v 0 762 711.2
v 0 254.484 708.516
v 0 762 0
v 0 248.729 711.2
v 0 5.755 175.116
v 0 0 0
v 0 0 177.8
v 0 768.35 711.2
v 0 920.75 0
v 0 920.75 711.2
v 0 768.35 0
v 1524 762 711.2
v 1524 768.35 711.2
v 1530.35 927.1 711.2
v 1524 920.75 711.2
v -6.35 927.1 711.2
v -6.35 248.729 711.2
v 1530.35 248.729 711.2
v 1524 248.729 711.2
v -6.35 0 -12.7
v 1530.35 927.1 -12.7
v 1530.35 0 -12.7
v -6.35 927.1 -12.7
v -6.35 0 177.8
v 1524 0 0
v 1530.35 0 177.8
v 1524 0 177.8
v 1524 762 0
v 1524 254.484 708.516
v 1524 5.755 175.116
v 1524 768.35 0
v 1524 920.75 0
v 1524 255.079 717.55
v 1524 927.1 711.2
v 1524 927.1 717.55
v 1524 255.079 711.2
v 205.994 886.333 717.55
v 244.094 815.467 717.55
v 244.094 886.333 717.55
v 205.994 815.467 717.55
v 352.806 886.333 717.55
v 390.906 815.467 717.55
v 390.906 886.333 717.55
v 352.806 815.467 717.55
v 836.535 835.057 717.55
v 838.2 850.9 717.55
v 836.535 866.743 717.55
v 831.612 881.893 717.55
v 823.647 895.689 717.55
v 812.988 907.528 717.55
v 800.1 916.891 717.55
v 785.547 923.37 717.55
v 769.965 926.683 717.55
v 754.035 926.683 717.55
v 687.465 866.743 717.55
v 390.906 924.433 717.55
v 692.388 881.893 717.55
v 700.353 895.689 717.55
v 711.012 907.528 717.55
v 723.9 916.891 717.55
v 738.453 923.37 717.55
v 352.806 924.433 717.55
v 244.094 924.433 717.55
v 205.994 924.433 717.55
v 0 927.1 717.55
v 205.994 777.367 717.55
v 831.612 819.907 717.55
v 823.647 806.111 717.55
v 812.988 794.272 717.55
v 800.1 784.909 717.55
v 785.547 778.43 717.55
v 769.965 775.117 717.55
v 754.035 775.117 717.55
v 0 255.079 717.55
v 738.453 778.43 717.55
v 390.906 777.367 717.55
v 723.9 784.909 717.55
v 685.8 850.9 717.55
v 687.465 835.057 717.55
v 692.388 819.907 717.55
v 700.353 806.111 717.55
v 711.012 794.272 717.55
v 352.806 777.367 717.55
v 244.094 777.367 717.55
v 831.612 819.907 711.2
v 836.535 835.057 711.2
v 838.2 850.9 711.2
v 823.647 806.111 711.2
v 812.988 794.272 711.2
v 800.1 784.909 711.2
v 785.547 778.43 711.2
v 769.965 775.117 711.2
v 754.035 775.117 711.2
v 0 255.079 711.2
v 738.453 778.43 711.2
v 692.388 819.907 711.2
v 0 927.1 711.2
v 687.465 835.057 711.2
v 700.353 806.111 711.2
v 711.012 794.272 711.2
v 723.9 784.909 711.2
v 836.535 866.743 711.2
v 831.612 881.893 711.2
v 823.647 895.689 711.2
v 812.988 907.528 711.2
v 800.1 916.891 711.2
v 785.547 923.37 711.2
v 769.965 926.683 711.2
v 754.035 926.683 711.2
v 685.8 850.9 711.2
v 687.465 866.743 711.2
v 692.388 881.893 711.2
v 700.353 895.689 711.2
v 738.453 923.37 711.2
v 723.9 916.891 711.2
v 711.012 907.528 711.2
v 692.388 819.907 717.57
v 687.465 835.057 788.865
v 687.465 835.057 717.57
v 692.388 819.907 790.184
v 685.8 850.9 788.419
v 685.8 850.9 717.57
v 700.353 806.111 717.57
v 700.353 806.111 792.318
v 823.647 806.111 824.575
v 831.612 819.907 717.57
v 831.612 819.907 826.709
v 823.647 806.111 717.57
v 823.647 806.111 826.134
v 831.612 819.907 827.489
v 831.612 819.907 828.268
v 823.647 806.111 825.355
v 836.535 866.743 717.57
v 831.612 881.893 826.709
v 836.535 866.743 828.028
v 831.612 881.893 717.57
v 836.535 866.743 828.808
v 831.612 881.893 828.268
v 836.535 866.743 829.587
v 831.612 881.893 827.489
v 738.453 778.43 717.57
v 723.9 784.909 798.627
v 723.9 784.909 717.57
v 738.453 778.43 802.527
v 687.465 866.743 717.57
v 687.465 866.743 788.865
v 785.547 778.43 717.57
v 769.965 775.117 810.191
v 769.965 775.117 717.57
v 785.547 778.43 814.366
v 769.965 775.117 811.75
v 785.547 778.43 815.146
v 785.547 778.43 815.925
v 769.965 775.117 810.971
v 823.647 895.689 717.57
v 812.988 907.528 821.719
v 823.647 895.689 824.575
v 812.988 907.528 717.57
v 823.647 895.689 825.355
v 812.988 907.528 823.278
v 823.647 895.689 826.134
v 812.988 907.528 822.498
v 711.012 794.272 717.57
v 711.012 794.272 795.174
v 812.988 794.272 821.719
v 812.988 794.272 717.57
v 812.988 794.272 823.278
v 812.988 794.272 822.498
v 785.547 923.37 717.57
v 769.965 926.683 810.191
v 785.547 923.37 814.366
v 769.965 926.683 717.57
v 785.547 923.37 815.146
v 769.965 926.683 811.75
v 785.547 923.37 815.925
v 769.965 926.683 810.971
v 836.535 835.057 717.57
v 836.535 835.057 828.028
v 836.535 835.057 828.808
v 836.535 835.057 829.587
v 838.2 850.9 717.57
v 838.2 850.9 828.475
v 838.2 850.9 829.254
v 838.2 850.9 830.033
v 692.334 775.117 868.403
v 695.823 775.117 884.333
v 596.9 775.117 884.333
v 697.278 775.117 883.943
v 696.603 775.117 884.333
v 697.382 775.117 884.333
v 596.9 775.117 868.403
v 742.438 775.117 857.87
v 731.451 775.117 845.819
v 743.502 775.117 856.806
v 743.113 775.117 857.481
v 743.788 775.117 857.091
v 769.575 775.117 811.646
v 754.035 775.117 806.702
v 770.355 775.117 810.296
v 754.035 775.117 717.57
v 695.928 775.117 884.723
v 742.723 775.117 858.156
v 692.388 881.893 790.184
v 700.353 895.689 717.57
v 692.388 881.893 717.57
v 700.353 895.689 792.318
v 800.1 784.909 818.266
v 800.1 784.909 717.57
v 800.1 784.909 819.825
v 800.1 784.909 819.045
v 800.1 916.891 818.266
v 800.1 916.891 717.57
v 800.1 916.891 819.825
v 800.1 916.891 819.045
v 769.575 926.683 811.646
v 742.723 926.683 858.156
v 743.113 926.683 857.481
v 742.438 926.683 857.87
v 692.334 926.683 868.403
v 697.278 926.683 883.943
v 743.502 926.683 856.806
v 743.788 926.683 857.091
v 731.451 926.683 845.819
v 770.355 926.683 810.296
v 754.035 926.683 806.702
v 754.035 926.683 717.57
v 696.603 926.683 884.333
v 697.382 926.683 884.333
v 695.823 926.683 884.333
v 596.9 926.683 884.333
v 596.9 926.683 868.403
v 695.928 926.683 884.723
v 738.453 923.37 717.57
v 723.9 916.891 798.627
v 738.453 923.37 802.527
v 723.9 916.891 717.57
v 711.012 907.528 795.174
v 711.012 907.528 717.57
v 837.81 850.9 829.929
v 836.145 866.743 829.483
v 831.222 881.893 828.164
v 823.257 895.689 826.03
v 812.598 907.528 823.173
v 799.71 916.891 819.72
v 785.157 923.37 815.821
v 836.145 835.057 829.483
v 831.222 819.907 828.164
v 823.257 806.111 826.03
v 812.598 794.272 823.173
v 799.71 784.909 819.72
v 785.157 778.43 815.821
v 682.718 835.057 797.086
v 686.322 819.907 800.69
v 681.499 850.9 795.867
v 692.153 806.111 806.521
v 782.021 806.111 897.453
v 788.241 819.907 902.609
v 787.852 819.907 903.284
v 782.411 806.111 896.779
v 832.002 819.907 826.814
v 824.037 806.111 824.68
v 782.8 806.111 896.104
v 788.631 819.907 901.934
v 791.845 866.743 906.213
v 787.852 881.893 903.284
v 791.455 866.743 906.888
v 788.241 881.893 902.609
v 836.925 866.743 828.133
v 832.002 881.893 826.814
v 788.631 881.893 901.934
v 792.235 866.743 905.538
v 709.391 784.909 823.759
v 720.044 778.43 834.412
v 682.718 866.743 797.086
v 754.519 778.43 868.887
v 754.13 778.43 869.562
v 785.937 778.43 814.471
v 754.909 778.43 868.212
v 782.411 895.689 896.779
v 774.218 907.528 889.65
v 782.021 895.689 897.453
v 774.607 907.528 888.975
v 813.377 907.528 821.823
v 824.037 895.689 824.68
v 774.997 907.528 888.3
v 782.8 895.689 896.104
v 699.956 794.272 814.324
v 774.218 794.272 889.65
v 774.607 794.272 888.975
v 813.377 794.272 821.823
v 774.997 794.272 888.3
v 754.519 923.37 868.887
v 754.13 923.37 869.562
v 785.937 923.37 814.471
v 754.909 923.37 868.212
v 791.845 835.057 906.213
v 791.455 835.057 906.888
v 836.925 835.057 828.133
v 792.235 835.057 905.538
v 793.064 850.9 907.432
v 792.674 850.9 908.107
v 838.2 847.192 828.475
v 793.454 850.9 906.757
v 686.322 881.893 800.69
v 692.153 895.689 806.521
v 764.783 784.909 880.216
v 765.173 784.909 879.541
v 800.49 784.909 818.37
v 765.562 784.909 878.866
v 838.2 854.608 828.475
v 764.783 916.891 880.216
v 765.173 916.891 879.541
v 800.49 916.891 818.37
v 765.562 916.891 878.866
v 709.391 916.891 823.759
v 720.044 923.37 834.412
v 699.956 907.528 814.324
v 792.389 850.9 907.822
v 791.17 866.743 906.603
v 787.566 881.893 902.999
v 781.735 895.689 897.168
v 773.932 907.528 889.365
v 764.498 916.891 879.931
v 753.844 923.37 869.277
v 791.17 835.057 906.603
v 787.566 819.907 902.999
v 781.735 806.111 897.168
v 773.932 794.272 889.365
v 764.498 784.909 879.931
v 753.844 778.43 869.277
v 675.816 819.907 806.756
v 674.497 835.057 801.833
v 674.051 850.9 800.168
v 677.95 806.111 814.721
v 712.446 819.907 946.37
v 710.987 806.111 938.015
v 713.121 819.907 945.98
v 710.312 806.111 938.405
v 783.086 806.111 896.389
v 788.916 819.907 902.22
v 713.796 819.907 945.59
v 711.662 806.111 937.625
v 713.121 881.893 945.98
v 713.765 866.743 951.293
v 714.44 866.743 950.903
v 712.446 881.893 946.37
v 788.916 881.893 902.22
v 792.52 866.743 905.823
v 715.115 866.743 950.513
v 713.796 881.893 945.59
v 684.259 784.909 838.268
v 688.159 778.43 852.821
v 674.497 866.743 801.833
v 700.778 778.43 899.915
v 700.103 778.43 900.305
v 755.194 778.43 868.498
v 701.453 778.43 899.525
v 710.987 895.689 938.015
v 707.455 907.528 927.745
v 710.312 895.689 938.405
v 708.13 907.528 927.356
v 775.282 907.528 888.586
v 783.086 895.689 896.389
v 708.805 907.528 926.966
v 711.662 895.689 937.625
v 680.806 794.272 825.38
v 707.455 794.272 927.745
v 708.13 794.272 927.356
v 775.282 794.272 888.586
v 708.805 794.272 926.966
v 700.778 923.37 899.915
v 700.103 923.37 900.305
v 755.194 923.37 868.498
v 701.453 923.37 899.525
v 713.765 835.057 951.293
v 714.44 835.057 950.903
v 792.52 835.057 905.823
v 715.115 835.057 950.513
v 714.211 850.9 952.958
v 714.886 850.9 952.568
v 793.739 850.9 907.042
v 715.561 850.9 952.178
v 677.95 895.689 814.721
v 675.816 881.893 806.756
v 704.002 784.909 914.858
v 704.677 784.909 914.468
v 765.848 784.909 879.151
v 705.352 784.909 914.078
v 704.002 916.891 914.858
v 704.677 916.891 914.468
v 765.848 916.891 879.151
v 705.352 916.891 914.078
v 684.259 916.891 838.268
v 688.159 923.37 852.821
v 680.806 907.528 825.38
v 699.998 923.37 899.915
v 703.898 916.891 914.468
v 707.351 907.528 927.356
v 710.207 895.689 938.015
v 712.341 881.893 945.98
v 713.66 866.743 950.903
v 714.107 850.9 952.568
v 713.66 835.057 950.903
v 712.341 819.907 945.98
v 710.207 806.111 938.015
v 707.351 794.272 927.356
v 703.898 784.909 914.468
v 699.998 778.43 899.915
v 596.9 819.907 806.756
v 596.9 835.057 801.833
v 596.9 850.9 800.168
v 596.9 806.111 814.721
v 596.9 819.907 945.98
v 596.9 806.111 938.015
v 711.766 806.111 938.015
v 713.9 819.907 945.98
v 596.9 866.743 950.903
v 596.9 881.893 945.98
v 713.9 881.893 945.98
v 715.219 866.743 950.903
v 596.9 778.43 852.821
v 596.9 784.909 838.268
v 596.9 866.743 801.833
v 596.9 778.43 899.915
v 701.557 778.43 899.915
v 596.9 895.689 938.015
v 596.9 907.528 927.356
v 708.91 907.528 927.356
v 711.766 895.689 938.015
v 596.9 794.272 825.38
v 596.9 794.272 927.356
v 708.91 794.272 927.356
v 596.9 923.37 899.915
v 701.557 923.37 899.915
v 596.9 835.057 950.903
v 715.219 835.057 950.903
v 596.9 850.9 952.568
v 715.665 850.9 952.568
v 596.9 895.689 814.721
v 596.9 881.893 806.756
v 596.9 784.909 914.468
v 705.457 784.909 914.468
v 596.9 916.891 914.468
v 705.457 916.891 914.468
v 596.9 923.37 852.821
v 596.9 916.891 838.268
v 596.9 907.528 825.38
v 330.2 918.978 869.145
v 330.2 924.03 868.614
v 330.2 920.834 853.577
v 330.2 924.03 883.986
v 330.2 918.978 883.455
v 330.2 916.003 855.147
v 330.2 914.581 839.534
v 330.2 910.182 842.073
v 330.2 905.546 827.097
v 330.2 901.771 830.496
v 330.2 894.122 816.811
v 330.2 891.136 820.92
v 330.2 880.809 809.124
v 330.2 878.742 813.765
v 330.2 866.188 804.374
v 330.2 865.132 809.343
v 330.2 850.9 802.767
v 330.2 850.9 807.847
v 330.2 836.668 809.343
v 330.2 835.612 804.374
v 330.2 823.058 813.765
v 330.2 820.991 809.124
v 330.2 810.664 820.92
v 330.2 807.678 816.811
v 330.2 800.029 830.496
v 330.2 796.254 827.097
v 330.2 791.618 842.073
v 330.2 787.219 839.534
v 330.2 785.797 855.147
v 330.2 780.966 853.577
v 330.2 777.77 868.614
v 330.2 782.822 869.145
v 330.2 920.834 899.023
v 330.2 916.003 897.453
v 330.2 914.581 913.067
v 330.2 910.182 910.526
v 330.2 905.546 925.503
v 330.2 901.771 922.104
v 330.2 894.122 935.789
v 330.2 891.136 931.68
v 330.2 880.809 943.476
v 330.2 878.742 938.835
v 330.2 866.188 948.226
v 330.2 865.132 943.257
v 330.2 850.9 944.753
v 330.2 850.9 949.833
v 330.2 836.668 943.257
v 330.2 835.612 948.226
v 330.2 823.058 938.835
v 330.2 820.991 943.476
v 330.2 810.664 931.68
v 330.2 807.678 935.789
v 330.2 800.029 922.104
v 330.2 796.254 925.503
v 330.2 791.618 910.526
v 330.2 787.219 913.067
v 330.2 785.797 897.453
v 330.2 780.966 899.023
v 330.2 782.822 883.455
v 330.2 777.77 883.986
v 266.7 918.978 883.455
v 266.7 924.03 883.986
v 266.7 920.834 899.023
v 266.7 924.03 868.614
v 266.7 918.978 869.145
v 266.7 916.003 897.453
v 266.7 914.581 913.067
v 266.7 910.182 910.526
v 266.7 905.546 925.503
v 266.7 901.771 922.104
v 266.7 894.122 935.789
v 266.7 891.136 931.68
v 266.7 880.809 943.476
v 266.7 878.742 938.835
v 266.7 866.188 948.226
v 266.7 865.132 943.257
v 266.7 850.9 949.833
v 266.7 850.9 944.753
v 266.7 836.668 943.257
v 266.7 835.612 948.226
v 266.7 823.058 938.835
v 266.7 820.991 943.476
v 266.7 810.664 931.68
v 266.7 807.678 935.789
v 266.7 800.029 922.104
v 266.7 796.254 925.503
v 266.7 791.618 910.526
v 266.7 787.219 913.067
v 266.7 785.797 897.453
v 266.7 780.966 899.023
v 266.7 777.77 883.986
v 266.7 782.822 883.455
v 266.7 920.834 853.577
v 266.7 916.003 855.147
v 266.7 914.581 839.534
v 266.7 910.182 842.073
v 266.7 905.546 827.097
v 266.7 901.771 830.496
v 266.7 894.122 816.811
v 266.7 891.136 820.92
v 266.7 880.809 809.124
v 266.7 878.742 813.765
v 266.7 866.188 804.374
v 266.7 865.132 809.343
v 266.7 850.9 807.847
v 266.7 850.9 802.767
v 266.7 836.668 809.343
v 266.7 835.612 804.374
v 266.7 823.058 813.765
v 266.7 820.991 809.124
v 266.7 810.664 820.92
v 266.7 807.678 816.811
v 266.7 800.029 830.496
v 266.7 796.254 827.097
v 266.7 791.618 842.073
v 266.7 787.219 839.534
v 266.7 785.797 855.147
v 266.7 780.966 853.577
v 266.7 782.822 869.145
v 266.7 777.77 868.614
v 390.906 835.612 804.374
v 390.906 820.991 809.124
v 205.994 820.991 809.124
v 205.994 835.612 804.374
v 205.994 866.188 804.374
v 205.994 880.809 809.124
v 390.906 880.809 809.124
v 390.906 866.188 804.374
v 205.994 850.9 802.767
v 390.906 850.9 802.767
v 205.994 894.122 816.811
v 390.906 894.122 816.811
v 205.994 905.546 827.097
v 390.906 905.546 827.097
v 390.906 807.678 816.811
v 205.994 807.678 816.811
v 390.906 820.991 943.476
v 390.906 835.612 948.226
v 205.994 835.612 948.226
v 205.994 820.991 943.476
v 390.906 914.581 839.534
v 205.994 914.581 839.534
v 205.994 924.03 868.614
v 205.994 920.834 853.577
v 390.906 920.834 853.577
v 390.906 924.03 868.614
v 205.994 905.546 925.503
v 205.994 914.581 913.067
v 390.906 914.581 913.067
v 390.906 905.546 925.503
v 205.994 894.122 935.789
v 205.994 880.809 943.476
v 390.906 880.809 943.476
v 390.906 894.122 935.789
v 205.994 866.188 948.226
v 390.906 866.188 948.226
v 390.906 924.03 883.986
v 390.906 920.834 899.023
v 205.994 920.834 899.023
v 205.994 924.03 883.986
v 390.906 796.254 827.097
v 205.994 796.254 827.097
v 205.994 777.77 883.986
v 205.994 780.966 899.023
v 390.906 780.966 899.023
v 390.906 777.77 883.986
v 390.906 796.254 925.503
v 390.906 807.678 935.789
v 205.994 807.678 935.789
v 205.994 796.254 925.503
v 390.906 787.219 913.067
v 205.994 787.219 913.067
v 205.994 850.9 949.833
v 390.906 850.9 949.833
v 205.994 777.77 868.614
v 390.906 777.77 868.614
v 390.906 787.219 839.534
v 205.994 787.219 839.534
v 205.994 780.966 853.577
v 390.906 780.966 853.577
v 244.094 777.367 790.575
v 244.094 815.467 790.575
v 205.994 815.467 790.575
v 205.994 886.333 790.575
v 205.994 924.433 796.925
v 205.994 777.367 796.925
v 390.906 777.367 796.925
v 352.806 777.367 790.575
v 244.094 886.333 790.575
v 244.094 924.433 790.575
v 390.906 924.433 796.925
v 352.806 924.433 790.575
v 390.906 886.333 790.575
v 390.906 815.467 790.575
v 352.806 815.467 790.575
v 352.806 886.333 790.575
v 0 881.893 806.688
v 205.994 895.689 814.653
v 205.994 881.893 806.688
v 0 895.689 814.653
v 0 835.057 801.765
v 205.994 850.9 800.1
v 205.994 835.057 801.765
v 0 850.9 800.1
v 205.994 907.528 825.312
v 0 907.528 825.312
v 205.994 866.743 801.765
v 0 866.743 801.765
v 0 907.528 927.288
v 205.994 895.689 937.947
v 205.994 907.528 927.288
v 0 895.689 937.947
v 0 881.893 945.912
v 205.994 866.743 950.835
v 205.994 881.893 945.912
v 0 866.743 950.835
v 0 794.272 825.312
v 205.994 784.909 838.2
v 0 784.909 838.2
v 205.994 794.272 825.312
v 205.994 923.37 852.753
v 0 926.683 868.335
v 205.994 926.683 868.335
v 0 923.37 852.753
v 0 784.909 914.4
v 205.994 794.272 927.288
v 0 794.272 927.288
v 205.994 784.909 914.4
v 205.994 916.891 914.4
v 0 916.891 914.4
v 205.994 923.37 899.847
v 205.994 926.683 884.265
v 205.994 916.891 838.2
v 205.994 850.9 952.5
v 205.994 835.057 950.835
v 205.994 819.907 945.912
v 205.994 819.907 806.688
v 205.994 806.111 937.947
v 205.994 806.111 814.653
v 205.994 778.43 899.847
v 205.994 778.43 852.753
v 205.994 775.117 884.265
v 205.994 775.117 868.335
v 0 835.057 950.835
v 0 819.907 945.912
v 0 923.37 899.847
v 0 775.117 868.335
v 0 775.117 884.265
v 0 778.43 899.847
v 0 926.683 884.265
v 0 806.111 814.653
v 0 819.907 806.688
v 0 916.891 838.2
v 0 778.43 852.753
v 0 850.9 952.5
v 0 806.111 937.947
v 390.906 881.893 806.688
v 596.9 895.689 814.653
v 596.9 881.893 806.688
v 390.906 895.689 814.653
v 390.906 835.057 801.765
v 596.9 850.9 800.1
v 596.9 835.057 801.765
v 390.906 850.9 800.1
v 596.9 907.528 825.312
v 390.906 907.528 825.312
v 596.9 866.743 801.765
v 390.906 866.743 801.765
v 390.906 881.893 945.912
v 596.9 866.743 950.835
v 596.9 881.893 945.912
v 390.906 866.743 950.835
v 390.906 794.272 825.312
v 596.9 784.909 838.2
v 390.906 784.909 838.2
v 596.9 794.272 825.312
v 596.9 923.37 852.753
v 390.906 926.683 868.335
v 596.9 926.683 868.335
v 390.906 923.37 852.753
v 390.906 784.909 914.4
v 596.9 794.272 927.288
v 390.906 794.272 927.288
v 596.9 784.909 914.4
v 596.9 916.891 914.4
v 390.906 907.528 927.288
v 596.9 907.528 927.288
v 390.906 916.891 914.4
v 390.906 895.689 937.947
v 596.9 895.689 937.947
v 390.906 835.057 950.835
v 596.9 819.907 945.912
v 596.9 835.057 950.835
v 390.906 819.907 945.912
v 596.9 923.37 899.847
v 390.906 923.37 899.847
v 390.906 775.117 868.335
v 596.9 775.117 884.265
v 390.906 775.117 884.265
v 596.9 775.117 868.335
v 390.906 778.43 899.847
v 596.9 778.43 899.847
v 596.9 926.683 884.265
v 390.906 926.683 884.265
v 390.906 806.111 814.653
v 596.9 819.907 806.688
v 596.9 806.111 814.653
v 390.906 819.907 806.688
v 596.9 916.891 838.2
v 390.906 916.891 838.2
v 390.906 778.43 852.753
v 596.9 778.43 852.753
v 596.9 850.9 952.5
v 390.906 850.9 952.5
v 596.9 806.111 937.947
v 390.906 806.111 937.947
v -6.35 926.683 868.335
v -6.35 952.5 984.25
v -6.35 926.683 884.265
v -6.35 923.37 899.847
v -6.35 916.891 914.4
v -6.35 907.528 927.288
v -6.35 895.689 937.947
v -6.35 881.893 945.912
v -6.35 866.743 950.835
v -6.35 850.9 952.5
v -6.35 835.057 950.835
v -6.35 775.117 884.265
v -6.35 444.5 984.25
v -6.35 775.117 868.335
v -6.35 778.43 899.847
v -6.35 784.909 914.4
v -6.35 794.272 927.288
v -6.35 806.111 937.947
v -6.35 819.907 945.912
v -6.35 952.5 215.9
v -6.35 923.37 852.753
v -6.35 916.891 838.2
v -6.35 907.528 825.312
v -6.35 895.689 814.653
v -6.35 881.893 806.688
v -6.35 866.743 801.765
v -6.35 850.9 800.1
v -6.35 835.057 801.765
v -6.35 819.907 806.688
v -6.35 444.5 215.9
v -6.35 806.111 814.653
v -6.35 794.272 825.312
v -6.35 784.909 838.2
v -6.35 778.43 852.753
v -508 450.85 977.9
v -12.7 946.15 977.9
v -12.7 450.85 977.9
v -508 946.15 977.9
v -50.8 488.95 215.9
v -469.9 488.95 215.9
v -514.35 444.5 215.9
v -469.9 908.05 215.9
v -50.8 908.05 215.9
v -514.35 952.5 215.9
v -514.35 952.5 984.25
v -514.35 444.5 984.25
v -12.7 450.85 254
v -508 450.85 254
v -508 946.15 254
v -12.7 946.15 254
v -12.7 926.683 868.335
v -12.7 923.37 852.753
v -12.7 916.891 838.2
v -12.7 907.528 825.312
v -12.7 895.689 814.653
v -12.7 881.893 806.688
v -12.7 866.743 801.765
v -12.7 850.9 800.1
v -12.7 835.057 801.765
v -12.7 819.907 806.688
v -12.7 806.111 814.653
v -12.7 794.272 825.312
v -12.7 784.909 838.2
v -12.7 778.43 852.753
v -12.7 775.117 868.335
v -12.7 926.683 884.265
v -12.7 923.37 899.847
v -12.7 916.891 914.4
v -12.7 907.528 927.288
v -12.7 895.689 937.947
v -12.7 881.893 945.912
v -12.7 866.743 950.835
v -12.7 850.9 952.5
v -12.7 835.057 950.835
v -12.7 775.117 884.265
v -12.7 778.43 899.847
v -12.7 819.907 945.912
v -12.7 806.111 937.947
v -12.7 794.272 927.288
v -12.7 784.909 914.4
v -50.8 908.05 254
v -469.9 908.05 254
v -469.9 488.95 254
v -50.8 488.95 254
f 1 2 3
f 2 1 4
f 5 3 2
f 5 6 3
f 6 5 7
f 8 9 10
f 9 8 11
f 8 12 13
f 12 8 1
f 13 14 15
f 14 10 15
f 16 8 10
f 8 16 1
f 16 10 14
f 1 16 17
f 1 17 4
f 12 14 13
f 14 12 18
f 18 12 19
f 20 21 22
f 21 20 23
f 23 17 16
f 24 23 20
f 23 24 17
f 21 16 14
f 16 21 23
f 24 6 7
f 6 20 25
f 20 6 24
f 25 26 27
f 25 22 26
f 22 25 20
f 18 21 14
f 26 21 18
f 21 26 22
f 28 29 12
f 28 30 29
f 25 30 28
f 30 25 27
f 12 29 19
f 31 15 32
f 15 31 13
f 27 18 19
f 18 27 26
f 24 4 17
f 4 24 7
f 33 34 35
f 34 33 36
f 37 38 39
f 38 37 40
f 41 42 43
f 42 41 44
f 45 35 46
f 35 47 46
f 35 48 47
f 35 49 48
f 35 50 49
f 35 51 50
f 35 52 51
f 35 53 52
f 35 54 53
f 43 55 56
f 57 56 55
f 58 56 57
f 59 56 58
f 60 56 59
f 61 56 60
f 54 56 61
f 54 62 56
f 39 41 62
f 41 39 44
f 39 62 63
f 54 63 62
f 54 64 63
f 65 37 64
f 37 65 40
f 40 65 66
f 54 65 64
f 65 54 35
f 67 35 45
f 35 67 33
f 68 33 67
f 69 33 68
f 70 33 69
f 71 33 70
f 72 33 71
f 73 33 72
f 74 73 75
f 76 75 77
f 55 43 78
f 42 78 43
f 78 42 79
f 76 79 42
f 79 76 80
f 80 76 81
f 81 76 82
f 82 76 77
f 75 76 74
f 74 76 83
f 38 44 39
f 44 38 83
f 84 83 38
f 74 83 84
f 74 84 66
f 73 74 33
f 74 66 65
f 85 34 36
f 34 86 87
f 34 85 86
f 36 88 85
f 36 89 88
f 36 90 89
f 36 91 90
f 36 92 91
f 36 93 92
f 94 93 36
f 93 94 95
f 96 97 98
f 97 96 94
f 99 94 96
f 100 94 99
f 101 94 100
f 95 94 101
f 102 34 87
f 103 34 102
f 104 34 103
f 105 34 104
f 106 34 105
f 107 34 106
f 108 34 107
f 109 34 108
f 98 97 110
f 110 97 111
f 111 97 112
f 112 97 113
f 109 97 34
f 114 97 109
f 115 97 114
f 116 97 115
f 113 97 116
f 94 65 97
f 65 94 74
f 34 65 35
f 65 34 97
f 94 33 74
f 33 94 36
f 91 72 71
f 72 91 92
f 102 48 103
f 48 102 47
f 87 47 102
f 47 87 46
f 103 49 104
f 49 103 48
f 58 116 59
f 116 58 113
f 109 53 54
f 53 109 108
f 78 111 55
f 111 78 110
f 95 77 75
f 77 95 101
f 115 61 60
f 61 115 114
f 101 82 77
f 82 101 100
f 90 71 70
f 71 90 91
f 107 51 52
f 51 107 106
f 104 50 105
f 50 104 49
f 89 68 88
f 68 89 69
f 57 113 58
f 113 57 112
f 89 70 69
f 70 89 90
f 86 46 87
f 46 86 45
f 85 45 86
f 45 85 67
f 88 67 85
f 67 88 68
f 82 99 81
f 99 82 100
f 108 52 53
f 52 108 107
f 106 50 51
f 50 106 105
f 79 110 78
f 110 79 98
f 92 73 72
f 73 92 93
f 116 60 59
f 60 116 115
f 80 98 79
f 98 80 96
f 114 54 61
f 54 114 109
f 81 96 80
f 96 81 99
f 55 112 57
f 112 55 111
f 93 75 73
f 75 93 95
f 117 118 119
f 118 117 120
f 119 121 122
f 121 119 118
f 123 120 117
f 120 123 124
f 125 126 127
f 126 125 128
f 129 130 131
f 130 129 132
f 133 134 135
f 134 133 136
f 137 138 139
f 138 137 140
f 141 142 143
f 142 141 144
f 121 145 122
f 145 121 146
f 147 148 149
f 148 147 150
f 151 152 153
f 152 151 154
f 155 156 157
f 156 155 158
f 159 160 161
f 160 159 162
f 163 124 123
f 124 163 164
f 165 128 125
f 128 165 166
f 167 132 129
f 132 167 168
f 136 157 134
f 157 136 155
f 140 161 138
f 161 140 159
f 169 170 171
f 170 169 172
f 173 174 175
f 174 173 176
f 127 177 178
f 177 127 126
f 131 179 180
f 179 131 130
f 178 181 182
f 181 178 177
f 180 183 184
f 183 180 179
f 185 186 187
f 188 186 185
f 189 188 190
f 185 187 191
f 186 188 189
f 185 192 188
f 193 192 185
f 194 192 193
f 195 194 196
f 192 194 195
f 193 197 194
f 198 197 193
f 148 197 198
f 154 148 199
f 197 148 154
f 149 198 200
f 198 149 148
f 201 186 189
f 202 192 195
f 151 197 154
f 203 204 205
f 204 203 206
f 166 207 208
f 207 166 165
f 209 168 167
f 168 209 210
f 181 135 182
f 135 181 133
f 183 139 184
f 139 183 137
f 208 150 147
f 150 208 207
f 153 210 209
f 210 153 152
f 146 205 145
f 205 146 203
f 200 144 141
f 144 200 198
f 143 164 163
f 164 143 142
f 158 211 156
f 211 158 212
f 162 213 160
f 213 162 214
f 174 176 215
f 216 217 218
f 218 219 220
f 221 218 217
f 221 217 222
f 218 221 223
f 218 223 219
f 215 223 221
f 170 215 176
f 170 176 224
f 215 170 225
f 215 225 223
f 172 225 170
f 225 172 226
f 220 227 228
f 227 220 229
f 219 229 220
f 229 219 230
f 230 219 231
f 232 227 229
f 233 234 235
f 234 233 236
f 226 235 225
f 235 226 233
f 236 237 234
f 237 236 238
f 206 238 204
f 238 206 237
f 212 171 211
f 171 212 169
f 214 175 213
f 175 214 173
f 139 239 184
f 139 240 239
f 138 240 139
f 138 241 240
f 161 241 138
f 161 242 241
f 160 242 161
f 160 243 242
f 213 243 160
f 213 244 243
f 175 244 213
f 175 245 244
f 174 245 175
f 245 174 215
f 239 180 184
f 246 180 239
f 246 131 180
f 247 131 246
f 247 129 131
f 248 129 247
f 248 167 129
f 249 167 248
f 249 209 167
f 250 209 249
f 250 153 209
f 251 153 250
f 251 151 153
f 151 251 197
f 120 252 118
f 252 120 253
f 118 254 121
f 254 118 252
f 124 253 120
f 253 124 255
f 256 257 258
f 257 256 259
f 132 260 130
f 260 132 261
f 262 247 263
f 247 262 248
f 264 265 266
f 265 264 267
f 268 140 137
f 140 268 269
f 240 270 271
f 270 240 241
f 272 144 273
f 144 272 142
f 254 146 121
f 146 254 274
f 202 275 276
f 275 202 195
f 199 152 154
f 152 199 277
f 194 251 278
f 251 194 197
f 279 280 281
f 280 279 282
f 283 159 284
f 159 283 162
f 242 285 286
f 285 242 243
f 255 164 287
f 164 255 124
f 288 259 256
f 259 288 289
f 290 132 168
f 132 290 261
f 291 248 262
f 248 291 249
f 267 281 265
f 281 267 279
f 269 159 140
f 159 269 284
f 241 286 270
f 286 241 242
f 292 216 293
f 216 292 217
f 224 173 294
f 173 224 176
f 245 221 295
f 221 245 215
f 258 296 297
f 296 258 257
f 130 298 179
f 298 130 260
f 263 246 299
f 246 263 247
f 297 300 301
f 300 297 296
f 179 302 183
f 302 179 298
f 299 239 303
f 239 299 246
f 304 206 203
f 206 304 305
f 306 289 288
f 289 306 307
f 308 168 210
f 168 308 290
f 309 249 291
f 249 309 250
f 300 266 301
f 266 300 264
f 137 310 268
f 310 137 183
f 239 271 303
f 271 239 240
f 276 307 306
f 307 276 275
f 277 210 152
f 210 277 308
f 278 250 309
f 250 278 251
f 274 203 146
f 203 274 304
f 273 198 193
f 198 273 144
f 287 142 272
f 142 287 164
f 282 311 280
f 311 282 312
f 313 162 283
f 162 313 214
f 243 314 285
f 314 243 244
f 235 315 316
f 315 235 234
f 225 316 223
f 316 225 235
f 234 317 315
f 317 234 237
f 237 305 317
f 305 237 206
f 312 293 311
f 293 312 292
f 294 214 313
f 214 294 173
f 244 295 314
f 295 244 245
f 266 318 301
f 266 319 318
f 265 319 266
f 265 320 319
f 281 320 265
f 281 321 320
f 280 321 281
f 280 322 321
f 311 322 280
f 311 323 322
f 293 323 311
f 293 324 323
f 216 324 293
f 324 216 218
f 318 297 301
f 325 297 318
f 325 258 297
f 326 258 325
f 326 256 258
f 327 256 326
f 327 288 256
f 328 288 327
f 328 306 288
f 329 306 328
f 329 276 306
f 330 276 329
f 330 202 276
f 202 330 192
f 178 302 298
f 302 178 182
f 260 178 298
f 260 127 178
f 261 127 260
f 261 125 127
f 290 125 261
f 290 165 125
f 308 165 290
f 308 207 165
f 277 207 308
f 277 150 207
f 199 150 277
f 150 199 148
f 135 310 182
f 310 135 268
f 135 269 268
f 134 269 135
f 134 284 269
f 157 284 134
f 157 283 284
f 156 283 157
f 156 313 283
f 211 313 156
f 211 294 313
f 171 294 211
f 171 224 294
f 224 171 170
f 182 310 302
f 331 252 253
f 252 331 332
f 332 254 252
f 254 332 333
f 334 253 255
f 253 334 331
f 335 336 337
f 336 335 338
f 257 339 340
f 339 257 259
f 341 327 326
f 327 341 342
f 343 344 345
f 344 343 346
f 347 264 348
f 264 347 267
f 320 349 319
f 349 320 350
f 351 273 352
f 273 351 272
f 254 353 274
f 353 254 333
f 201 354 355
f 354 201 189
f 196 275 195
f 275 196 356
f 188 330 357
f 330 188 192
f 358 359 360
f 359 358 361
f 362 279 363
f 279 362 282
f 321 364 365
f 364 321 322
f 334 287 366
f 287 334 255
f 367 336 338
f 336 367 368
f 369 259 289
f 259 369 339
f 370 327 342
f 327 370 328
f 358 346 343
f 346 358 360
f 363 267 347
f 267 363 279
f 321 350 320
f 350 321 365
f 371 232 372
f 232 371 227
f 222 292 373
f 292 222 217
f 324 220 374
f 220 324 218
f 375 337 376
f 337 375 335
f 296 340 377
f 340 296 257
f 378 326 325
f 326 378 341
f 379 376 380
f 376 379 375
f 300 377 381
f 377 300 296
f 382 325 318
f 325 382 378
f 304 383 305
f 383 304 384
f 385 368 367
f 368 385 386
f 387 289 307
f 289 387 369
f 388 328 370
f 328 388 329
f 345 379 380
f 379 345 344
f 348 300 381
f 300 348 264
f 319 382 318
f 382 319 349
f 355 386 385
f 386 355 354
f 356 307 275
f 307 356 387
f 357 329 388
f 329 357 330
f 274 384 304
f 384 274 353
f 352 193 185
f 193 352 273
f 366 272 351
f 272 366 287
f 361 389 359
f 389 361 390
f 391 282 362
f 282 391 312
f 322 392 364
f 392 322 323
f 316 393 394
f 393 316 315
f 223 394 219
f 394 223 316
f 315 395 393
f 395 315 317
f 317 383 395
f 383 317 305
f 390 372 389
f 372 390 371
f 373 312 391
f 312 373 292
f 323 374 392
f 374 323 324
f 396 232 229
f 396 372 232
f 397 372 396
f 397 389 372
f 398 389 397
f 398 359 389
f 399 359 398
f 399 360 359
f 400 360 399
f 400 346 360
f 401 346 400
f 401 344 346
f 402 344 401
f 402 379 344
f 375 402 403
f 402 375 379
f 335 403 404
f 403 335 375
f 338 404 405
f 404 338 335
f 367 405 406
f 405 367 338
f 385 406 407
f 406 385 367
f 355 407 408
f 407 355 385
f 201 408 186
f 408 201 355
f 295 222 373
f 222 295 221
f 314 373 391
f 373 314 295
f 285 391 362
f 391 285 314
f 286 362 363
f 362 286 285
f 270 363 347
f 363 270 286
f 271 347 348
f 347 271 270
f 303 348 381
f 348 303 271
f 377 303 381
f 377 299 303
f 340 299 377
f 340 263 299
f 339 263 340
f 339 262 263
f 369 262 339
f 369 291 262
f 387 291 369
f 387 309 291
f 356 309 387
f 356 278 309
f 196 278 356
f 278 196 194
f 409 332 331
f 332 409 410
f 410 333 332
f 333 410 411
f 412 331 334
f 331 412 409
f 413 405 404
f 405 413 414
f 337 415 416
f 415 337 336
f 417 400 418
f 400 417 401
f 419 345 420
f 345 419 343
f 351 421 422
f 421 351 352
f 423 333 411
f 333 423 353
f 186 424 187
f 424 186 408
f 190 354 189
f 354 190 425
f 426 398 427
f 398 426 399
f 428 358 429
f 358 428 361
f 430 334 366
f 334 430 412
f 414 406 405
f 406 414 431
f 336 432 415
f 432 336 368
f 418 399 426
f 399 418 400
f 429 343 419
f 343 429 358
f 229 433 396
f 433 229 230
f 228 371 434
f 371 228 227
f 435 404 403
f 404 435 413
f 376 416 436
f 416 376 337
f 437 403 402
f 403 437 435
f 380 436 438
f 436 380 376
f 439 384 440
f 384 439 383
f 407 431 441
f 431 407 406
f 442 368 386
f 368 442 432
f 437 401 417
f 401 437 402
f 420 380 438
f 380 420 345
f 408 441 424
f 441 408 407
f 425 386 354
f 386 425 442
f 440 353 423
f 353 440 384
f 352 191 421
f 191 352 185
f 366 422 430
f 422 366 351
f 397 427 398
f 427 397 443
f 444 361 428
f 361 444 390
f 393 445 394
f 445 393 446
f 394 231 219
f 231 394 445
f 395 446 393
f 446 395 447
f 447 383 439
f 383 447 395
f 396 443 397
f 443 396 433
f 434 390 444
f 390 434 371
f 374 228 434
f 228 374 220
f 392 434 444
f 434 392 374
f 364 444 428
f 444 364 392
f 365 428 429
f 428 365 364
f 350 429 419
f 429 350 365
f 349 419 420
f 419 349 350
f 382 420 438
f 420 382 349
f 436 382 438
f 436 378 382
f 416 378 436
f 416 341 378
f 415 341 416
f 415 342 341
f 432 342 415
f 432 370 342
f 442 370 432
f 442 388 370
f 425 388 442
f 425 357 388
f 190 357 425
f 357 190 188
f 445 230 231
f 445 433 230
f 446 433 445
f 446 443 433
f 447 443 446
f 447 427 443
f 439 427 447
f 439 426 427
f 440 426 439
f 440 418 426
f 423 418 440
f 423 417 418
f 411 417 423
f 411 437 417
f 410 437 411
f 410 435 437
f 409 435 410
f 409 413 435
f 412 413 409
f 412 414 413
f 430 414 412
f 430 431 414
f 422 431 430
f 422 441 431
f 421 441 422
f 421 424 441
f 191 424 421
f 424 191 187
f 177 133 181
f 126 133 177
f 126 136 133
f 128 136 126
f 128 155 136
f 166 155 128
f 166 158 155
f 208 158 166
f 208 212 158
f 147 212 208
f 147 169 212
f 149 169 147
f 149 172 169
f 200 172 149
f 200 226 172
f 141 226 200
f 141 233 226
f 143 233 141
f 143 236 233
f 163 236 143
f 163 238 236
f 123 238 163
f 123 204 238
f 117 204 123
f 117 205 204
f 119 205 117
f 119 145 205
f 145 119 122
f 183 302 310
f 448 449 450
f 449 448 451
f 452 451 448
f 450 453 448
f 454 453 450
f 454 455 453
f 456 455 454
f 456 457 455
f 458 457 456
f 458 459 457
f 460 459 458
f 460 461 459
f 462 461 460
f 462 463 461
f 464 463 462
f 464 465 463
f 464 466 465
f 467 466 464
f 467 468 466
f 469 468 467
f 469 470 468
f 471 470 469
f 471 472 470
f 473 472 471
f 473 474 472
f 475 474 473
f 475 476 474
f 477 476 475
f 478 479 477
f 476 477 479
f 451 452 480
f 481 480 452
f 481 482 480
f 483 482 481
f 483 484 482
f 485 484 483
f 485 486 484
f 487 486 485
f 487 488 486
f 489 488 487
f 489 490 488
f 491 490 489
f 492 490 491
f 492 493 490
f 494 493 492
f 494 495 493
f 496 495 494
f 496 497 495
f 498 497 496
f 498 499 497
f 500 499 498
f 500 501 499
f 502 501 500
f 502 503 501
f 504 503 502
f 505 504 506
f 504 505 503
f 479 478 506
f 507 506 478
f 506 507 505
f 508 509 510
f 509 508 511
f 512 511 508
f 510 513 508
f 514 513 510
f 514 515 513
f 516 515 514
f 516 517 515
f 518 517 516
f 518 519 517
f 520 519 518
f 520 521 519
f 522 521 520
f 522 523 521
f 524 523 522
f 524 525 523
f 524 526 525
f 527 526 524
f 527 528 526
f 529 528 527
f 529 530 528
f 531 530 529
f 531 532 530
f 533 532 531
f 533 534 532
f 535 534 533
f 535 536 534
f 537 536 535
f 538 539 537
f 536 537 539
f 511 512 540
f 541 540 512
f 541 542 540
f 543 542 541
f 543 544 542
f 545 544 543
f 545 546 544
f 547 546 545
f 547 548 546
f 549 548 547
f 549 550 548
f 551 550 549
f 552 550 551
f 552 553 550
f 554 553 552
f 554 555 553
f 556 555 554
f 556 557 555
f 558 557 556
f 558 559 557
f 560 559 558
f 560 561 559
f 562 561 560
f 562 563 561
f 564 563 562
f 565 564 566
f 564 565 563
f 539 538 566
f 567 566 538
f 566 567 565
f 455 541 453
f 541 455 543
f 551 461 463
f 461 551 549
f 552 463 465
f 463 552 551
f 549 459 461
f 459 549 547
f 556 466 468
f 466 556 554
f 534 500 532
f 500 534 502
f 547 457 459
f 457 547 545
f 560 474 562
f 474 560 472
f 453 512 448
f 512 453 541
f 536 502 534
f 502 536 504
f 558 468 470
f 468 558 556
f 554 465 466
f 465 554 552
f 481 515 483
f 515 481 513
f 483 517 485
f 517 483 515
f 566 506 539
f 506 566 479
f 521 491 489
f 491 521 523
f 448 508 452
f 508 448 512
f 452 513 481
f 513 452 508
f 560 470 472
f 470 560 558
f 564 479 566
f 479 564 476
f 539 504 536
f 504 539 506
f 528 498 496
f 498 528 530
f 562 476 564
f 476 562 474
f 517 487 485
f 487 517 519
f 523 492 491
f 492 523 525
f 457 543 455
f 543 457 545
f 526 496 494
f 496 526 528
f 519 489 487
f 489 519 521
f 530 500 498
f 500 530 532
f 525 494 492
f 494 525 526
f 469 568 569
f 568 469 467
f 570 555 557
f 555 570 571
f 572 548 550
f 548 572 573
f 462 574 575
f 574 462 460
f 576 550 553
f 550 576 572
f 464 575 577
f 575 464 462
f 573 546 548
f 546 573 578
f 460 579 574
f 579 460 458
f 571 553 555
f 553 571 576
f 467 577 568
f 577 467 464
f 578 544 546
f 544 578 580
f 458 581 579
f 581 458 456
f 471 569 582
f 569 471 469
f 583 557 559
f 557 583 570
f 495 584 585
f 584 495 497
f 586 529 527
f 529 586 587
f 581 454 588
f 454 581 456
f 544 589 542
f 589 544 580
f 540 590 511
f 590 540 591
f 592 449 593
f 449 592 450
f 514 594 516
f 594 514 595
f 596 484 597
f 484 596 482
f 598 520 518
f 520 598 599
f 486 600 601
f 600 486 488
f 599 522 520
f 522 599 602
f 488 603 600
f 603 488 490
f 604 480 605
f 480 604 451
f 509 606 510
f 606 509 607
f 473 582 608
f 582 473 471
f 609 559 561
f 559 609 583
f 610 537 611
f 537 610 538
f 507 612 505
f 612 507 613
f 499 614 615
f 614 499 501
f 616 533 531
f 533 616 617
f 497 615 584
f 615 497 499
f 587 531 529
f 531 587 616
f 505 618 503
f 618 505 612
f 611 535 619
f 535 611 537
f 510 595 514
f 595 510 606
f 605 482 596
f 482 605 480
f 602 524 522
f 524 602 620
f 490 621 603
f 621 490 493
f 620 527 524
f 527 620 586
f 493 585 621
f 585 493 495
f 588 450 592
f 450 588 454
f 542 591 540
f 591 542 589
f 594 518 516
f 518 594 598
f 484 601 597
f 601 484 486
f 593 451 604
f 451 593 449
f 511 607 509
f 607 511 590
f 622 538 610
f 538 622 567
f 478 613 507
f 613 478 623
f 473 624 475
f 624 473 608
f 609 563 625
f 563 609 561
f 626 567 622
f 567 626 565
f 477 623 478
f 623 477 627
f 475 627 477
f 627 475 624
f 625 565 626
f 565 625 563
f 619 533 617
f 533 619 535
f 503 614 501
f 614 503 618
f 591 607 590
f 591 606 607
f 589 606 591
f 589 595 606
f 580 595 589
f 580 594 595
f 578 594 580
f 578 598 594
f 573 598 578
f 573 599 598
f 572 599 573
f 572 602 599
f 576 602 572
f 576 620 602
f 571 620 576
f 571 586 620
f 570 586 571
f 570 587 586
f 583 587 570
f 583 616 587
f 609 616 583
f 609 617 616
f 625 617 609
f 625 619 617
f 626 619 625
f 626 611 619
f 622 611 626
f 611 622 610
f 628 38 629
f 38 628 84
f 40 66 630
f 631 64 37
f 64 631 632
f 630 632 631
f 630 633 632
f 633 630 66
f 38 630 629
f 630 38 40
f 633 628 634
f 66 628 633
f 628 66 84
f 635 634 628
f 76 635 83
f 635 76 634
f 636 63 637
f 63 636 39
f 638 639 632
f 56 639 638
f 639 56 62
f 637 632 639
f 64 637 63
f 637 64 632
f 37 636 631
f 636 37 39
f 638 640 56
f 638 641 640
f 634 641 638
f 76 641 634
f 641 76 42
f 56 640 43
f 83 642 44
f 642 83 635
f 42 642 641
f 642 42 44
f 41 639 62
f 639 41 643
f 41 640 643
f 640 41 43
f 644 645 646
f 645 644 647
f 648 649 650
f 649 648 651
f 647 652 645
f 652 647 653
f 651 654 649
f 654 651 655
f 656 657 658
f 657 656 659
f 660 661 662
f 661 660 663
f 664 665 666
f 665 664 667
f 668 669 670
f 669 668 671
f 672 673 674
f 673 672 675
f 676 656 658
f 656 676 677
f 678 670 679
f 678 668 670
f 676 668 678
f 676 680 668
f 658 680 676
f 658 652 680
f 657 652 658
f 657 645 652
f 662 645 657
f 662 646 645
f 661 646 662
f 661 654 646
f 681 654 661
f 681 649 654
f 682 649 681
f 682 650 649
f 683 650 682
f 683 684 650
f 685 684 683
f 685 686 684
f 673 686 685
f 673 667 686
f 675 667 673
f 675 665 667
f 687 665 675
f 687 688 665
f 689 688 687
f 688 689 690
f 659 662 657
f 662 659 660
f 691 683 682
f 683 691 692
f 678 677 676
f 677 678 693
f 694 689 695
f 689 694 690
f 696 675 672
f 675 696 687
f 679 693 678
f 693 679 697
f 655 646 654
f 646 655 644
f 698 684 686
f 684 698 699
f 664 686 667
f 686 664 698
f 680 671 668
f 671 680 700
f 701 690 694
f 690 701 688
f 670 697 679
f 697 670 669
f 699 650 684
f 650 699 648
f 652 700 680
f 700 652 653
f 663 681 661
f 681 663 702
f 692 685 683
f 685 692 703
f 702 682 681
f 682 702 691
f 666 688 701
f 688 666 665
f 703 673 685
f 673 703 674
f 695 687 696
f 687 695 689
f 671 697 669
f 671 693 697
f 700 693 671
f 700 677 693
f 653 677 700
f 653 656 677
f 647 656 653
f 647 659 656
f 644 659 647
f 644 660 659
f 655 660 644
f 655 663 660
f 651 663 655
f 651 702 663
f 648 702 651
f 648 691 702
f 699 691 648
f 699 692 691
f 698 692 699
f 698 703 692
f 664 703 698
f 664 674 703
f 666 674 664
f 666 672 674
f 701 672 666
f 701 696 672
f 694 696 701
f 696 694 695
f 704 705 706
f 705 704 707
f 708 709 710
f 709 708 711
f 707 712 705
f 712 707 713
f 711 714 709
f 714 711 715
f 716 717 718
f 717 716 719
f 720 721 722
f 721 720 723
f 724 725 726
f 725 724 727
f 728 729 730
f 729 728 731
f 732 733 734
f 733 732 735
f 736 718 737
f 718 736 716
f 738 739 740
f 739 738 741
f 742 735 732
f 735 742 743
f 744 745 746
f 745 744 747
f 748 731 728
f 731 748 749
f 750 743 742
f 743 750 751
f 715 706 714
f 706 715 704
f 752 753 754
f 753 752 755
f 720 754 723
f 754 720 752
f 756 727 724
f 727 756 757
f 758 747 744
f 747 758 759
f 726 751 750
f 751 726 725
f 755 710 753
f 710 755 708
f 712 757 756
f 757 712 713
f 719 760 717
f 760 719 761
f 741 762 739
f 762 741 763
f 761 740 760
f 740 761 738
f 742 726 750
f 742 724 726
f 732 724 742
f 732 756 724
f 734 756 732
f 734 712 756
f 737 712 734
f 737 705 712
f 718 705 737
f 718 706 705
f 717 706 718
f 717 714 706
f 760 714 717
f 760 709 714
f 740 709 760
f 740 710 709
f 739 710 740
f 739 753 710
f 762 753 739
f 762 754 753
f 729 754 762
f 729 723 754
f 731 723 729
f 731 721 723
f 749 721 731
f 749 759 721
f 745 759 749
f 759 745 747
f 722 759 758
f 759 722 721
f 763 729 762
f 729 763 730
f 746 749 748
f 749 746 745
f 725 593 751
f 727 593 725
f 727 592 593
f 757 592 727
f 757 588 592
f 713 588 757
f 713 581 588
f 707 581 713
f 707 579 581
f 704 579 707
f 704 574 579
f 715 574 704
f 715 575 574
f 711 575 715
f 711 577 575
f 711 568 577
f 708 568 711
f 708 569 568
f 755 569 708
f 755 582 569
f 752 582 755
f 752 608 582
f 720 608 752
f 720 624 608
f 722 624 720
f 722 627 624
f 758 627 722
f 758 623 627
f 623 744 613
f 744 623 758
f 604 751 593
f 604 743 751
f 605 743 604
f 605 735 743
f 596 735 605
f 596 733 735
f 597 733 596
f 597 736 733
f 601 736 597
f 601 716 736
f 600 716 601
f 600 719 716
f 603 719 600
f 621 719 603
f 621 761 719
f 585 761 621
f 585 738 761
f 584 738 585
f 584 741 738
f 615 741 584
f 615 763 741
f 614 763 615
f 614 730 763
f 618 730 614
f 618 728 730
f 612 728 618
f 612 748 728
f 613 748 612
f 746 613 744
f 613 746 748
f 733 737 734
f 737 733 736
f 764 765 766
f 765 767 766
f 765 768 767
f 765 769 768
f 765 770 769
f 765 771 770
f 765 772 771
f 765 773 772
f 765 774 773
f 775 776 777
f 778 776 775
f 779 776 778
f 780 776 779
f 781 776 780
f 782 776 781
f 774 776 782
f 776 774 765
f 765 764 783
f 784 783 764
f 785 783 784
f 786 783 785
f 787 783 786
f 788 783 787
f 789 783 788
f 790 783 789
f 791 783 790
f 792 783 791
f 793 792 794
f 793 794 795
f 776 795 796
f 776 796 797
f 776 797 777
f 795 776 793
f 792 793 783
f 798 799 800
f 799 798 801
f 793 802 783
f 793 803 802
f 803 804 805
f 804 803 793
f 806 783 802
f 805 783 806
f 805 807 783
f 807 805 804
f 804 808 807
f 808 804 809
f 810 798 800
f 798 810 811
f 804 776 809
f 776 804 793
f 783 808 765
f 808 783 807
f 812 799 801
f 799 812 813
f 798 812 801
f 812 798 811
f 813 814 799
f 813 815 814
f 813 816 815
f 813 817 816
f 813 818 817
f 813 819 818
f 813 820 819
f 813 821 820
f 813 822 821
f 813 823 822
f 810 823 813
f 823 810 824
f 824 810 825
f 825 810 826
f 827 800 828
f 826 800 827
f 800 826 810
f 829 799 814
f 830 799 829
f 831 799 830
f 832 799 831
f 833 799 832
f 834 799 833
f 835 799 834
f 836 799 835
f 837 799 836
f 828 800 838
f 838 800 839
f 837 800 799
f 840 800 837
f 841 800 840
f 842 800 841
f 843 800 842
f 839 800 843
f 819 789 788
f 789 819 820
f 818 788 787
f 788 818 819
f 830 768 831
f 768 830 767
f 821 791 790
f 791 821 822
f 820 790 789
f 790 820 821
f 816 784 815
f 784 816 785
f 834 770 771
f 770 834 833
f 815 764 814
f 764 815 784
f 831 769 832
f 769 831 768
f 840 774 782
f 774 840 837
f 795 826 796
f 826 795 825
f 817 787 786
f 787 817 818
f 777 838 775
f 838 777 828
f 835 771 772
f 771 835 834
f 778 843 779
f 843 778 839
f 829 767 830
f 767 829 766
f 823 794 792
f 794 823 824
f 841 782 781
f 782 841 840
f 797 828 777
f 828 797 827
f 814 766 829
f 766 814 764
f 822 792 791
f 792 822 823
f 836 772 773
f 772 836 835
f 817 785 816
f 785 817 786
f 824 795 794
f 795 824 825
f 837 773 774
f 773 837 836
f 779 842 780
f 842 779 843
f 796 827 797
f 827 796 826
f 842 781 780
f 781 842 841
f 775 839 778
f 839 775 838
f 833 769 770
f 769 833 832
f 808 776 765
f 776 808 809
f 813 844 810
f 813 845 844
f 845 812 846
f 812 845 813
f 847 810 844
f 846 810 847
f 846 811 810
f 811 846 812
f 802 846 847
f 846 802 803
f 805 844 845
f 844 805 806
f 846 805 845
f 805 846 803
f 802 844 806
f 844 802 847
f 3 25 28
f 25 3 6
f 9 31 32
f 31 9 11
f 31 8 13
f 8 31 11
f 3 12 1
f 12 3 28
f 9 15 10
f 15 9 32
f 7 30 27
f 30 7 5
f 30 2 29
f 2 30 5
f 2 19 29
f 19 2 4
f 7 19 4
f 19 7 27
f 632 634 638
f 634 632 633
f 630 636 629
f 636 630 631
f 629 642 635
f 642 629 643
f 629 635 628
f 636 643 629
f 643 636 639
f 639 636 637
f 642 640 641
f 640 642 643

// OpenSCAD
INCH = 25.4;
FOOT = 12 * INCH;

PLYWOOD_THICK = INCH / 2;
PLYWOOD_THIN = INCH / 4;
WIDTH_2x2 = 1.5 * INCH;

usable_width = 5 * FOOT;
usable_depth = 2.5 * FOOT;
usable_height = 28 * INCH;
work_gap = 7 * INCH;
viewport_angle = 25;
duct_width = 6 * INCH;

cabinet_depth = usable_depth + PLYWOOD_THIN + duct_width + PLYWOOD_THIN;

viewport_height_orthogonal = usable_height - work_gap;
viewport_depth_orthogonal = viewport_height_orthogonal * tan(viewport_angle);

viewport_height = viewport_height_orthogonal / cos(viewport_angle);

echo(viewport_height / INCH);

roof_depth = cabinet_depth - viewport_depth_orthogonal - PLYWOOD_THIN;

elbow_height = 9.5 * INCH;

fan_length = 7.28 * INCH;
fan_diameter = 5.79 * INCH;

filter_box_width = 20 * INCH;
filter_box_depth = 20 * INCH;
filter_box_height = 30 * INCH;

FAN_COLOUR = [0.3, 0.3, 0.3];
DUCT_COLOUR = [0.65, 0.65, 0.65];

module fan()
{
  color(FAN_COLOUR)
  difference()
  {
    cylinder(h = fan_length, d = fan_diameter, center = true);
    
    difference()
    {
      cylinder(h = fan_length + 0.5 * INCH, d = fan_diameter - 0.1 * INCH, center = true);
      cylinder(h = fan_length + 0.5 * INCH / 2, d = fan_diameter + 1 * INCH, center = true);
    }
    
    difference()
    {
      cylinder(h = 2.5 * INCH, d = fan_diameter + 1 * INCH, center = true);
      cylinder(h = 2.5 * INCH, d = fan_diameter - 0.4 * INCH, center = true);
    }
    
    // meh, good enough
  }
}

module elbow()
{
  bend_height = elbow_height - 2 * INCH;

  color(DUCT_COLOUR)
  translate([-3 * INCH, 0, 0])
  intersection()
  {
    translate([0, -elbow_height / 2, 0])
    cube([elbow_height, elbow_height, elbow_height]);
    
    translate([3 * INCH, 0, 2.62 * INCH]) // ???
    for (i = [0 : 3])
    {
      translate([bend_height / 2 - 3, 0, 0])
      rotate([0, 30 * i, 0])
      translate([3 - bend_height / 2, 0, 0])
      difference()
      {
        cylinder(h = bend_height, d = 6 * INCH, center = true);
        
        if (i < 3)
        {
          translate([3 * INCH, 0, INCH / 5])
          rotate([0, 30 / 2, 0])
          translate([-5 * INCH, 0, 5 * INCH])
          cube([10 * INCH, 10 * INCH, 10 * INCH], center = true);
        }
        
        if (i > 0)
        {
          translate([3 * INCH, 0, -INCH / 5])
          rotate([0, -30 / 2, 0])
          translate([-5 * INCH, 0, -5 * INCH])
          cube([10 * INCH, 10 * INCH, 10 * INCH], center = true);
        }
      }
    }
  }
}

// Work area
translate([0, 0, -PLYWOOD_THICK])
cube([usable_width, cabinet_depth, PLYWOOD_THICK]);

// Left and right walls
difference()
{
  union()
  {
    translate([-PLYWOOD_THIN, 0, -PLYWOOD_THICK])
    cube([PLYWOOD_THIN, cabinet_depth, usable_height + PLYWOOD_THICK]);
    translate([usable_width, 0, -PLYWOOD_THICK])
    cube([PLYWOOD_THIN, cabinet_depth, usable_height + PLYWOOD_THICK]);
  }
  
  translate([0, 0, work_gap])
  rotate([-viewport_angle, 0, 0])
  translate([-INCH, -usable_depth, 0])
  cube([usable_width * 2, usable_depth, usable_height * 2]);
}

// Back of work area
translate([0, usable_depth, 0])
cube([usable_width, PLYWOOD_THIN, usable_height]);

// Back of entire construction
translate([0, cabinet_depth - PLYWOOD_THIN, 0])
cube([usable_width, PLYWOOD_THIN, usable_height]);

// Viewport
color(c = [0, 0.8, 0.8], alpha = 0.5)
translate([0, 0, work_gap])
rotate([-viewport_angle, 0, 0])
cube([usable_width, PLYWOOD_THIN, viewport_height]);

// Roof
translate([0, viewport_depth_orthogonal + PLYWOOD_THIN, usable_height])
difference()
{
  cube([usable_width, roof_depth, PLYWOOD_THIN]);
  echo(roof_depth / INCH);
  
  translate([usable_width / 2, roof_depth - duct_width / 2, -PLYWOOD_THIN / 2])
  cylinder(h = 2 * PLYWOOD_THIN, d = duct_width);
}

// Extraction
translate([usable_width / 2, cabinet_depth - 0.5 * duct_width, usable_height + PLYWOOD_THIN + 0.02])
rotate([0, 0, 180])
elbow();

fan_x = (usable_width / 2 + duct_width / 2 - elbow_height) / 2;
fan_y = cabinet_depth - duct_width / 2;

translate([fan_x, fan_y, usable_height + elbow_height - duct_width / 2])
rotate([0, 90, 0])
fan();

translate([(usable_width / 2 + duct_width / 2 - elbow_height) / 2, cabinet_depth - duct_width / 2, usable_height + elbow_height - duct_width - PLYWOOD_THIN])
cube([fan_length, fan_diameter, PLYWOOD_THIN], center = true);

for (x = [-1, 1])
  for (y = [-1, 1])
    translate([fan_x + x * (fan_length / 2 - WIDTH_2x2 / 2) - WIDTH_2x2 / 2, fan_y + y * (fan_diameter / 2 - WIDTH_2x2 / 2) - WIDTH_2x2 / 2, usable_height + PLYWOOD_THIN])
    cube([WIDTH_2x2, WIDTH_2x2, elbow_height - duct_width - PLYWOOD_THIN * 2]);

duct_connect_length = fan_x - fan_length / 2;

color(DUCT_COLOUR)
for (x = [-1, 1])
  translate([fan_x + x * (fan_x - duct_connect_length / 2), cabinet_depth - 3 * INCH, usable_height + elbow_height - 3 * INCH])
  rotate([0, 90, 0])
  cylinder(h = duct_connect_length, d = 6 * INCH, center = true);

// Filter Box
translate([-(filter_box_width + PLYWOOD_THIN), cabinet_depth - filter_box_depth + INCH, usable_height + elbow_height - filter_box_height + INCH])
{
  // Front & Back
  for (y = [0, 1])
    translate([0, y * (filter_box_depth - PLYWOOD_THIN), 0])
    cube([filter_box_width, PLYWOOD_THIN, filter_box_height]);
  
  // Left & Right
  difference()
  {
    for (x = [0, 1])
      translate([x * (filter_box_width - PLYWOOD_THIN), 0, 0])
      cube([PLYWOOD_THIN, filter_box_depth - PLYWOOD_THIN, filter_box_height]);

    translate([filter_box_width, filter_box_depth - 4 * INCH, filter_box_height - 4 * INCH])
    rotate([0, 90, 0])
    cylinder(h = INCH, d = 6 * INCH, center = true);
  }
  
  // Roof
  translate([0, 0, filter_box_height])
  cube([filter_box_width, filter_box_depth, PLYWOOD_THIN]);

  // Filter support
  translate([filter_box_width / 2, WIDTH_2x2 / 2 + PLYWOOD_THIN, WIDTH_2x2 / 2])
  cube([filter_box_width - 2 * PLYWOOD_THIN, WIDTH_2x2, WIDTH_2x2], center = true);
  translate([filter_box_width / 2, filter_box_depth - WIDTH_2x2 / 2 - PLYWOOD_THIN, WIDTH_2x2 / 2])
  cube([filter_box_width - 2 * PLYWOOD_THIN, WIDTH_2x2, WIDTH_2x2], center = true);
  
  translate([WIDTH_2x2 / 2 + PLYWOOD_THIN, filter_box_depth / 2, WIDTH_2x2 / 2])
  cube([WIDTH_2x2, filter_box_depth - 2 * (WIDTH_2x2 + PLYWOOD_THIN), WIDTH_2x2], center = true);
  translate([filter_box_width - WIDTH_2x2 / 2 - PLYWOOD_THIN, filter_box_depth / 2, WIDTH_2x2 / 2])
  cube([WIDTH_2x2, filter_box_depth - 2 * (WIDTH_2x2 + PLYWOOD_THIN), WIDTH_2x2], center = true);
}
